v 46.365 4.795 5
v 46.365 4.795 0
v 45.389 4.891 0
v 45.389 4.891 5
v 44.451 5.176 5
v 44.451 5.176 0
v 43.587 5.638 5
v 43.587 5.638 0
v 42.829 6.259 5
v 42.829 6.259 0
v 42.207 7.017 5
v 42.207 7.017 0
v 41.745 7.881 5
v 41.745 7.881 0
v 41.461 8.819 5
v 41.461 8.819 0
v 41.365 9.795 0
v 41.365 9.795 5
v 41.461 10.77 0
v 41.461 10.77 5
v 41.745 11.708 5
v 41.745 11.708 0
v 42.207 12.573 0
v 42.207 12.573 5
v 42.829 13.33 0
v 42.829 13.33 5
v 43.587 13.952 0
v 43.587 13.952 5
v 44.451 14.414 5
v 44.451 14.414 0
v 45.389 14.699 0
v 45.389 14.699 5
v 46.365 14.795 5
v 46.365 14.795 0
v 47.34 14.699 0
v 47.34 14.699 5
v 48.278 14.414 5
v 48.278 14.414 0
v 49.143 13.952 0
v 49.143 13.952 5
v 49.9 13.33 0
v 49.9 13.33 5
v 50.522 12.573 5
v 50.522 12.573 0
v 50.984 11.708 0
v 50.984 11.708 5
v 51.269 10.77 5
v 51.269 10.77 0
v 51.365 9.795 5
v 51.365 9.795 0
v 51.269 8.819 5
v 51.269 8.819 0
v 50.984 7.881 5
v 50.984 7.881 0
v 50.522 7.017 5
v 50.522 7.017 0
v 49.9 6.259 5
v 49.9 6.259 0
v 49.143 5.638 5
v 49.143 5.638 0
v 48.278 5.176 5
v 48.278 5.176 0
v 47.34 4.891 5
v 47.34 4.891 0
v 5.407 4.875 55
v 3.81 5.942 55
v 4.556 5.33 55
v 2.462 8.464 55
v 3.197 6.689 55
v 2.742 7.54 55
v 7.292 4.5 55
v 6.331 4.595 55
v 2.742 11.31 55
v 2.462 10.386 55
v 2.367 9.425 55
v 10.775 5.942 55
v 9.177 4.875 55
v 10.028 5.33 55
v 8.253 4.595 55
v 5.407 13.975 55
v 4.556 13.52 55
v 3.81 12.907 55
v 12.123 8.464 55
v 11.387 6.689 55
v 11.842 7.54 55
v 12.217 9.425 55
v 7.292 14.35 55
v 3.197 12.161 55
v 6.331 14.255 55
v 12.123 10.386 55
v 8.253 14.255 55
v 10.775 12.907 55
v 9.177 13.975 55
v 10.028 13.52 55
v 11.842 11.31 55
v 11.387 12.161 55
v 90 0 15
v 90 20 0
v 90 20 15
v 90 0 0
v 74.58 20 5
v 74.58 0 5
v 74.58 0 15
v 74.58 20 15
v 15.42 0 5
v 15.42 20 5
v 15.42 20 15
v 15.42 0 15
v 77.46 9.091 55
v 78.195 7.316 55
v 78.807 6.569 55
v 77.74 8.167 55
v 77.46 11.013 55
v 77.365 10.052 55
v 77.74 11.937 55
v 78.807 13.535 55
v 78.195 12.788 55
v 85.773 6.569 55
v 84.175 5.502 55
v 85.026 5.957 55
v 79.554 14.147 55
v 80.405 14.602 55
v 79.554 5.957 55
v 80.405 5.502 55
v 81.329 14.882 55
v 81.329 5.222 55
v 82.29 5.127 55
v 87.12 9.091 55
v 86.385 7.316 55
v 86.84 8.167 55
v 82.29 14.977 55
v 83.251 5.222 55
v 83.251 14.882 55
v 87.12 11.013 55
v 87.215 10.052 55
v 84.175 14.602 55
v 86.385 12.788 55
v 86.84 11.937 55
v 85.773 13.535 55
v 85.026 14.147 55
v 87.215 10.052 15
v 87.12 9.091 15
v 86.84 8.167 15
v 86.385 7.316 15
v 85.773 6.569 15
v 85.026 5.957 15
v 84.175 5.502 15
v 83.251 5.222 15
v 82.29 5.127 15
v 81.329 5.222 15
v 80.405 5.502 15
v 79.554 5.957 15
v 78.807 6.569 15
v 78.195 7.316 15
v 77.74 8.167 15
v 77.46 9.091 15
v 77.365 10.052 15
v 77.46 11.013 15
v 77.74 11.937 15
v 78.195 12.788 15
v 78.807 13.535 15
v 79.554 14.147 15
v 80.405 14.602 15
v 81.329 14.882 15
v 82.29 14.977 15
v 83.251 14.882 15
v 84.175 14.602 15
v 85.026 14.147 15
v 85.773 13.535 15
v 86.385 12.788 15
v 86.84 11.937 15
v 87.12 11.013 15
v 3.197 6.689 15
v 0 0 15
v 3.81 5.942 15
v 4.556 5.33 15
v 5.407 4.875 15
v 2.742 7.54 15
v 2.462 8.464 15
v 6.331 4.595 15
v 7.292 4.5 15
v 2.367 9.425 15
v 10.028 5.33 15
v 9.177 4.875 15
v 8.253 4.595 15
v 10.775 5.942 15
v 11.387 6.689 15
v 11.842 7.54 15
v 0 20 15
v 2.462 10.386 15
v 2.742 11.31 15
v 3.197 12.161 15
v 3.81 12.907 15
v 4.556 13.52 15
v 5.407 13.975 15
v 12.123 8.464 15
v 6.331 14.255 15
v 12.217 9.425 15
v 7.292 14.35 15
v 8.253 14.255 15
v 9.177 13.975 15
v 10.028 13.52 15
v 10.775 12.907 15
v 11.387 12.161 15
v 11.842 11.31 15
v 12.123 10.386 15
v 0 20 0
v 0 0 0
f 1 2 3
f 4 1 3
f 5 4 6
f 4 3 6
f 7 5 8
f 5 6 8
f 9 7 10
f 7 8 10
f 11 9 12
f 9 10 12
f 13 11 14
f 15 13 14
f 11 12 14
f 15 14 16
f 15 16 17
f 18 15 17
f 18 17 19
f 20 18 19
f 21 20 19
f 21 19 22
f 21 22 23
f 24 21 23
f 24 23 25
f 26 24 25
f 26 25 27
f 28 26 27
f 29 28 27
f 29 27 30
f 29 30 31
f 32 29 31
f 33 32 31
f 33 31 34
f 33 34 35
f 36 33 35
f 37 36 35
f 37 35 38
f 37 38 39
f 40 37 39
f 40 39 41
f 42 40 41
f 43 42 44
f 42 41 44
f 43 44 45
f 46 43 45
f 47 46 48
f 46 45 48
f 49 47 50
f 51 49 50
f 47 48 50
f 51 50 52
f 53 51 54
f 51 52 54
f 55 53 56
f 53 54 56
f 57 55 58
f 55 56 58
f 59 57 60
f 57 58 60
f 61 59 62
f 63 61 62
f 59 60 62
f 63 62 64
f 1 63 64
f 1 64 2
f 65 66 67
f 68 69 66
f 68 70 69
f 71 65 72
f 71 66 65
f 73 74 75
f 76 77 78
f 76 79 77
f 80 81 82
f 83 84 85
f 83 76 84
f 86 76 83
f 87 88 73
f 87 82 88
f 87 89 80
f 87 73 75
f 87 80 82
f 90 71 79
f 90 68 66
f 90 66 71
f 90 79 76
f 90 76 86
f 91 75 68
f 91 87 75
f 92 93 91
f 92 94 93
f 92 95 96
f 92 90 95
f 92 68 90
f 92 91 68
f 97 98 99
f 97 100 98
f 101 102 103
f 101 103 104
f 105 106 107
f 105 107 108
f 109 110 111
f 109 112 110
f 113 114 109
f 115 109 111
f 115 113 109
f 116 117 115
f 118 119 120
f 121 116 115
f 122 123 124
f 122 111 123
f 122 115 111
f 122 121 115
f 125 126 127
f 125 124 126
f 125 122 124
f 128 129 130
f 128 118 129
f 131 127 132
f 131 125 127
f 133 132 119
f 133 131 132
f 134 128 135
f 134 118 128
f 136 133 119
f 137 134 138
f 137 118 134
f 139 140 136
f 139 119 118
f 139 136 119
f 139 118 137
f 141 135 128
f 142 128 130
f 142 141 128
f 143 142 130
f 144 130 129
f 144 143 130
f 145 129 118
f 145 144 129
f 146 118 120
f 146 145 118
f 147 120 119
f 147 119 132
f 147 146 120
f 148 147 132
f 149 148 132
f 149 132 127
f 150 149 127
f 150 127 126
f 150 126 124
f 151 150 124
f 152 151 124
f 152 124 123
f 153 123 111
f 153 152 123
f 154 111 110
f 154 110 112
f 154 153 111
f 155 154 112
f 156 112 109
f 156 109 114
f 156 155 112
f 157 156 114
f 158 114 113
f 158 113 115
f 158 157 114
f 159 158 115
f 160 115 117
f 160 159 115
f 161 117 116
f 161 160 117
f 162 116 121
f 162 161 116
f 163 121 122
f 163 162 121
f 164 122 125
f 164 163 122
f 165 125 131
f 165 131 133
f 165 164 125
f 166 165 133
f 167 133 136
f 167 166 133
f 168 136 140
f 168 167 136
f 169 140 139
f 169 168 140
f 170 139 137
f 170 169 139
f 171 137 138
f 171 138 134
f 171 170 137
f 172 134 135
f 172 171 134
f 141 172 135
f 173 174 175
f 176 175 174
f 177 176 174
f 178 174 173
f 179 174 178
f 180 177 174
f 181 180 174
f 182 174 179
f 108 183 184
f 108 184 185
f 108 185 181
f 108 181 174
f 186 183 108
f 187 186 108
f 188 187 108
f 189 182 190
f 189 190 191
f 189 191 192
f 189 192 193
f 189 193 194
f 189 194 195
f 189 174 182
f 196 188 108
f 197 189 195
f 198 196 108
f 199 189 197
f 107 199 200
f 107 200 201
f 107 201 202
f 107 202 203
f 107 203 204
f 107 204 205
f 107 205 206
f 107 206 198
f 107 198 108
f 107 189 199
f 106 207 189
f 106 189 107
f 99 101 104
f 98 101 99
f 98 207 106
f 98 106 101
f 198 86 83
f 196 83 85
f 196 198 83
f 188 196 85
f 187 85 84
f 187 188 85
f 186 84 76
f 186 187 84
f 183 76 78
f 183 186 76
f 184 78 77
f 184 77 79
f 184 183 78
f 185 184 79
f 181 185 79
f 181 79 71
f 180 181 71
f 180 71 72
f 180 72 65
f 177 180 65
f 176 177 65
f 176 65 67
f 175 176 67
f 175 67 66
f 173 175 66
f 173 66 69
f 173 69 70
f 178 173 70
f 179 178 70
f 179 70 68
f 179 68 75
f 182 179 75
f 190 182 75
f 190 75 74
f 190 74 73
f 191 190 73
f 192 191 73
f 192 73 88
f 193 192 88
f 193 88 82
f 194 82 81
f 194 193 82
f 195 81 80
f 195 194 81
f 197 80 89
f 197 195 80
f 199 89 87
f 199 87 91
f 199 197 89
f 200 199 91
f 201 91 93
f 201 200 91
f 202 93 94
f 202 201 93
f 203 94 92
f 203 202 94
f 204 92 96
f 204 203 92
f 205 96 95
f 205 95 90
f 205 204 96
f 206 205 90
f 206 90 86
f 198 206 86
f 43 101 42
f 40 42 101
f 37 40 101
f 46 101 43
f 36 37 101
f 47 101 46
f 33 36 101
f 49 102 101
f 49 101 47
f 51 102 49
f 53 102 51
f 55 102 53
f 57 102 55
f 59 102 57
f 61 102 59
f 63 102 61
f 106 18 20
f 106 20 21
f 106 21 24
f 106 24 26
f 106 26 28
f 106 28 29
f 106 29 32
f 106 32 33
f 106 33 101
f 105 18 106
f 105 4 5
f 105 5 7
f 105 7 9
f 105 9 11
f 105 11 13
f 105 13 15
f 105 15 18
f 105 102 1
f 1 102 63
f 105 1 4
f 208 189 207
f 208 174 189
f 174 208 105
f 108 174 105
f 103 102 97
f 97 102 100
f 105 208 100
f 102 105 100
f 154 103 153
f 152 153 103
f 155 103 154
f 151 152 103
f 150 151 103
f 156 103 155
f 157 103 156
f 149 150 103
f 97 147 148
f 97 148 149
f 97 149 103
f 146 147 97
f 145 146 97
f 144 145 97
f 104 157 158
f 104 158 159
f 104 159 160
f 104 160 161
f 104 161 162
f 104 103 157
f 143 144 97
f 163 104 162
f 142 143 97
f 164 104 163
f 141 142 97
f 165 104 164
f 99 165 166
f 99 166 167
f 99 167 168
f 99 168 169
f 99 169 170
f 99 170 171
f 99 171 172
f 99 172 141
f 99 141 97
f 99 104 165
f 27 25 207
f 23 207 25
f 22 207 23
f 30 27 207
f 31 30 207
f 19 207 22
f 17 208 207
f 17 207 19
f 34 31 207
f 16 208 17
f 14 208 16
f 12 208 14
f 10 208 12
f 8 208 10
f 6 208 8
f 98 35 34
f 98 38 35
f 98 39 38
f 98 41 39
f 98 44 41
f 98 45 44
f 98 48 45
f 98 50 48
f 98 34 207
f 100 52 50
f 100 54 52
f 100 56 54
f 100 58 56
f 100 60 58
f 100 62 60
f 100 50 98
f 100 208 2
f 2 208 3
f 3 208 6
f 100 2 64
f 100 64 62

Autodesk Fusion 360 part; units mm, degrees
sketch "Sketch1" plane through (0, 0, 0) normal (0, 1, 0) x (1, 0, 0)
  line L0 (0, 0) -> (90, 0)
  line L1 (90, 0) -> (90, -5)
  line L2 (90, -5) -> (0, -5)
  line L3 (0, -5) -> (0, 0)
  dimension "d1" = 90
  dimension "d2" = 5
extrude "Extrude1" add sketch "Sketch1" along normal blind 10
extrude "Extrude2" add 1 faces at (30, 10, 1.6667) along direction (0, 1, 0) blind 5
extrude "Extrude3" add 1 faces at (30, 15, 1.6667) along direction (0, 1, 0) blind 5
sketch "Sketch2" plane through (0, 0, 5) normal (0, 0, 1) x (1, 0, 0)
  line L0 (0, 0) -> (90, 0)
  line L1 (90, 0) -> (90, 20)
  line L2 (90, 20) -> (0, 20)
  line L3 (0, 20) -> (0, 0)
  line L4 (0, 0) -> (15.42, 0)
  line L5 (15.42, 20) -> (0, 20)
  line L6 (15.42, 20) -> (15.42, 0)
  line L7 (0, 0) -> (0, 20)
  line L8 (90, 0) -> (74.58, 0)
  line L9 (74.58, 0) -> (74.58, 20)
  line L10 (74.58, 20) -> (90, 20)
  line L11 (90, 0) -> (90, 20)
  dimension "d9" = 15.42
  dimension "d10" = 15.42
extrude "Extrude4" add sketch "Sketch2" along normal blind 10 contours L0 L2 L3 L4 L5 L6 L7 | L0 L1 L2 L8 L9 L10 L11
sketch "Sketch3" plane through (0, 0, 15) normal (0, 0, 1) x (1, 0, 0)
  line L0 (15.42, 20) -> (0, 20)
  line L1 (0, 20) -> (0, 0)
  line L2 (0, 0) -> (15.42, 0)
  line L3 (15.42, 0) -> (15.42, 20)
  circle A0 centre (7.2922, 9.4249) radius 5
  dimension "d13" = 10
sketch "Sketch4" plane through (0, 0, 15) normal (0, 0, 1) x (1, 0, 0)
  line L0 (74.58, 0) -> (90, 0)
  line L1 (90, 0) -> (90, 20)
  line L2 (90, 20) -> (74.58, 20)
  line L3 (74.58, 20) -> (74.58, 0)
  circle A0 centre (82.29, 10.052) radius 5
  dimension "d14" = 10
extrude "Extrude5" add sketch "Sketch3" sketch "Sketch4" along normal blind 40 contours A0 of sketch 2 contours A0
thread "Thread1" "ISO Metric profile 10.0 M10x1.5 6g" major diameter 9.85 minor diameter 8.141 pitch 1.5 angle 60 resizes the face on face at (12.286, 9.1757, 41.6667)
thread "Thread2" "ISO Metric profile 10.0 M10x1.5 6g" major diameter 9.85 minor diameter 8.141 pitch 1.5 angle 60 resizes the face on face at (87.2838, 10.3013, 28.3333)
hole "Hole1" at (46.3648, 9.7949, 5) direction (0, 0, -1) diameter 10 depth 20 tip angle 118
